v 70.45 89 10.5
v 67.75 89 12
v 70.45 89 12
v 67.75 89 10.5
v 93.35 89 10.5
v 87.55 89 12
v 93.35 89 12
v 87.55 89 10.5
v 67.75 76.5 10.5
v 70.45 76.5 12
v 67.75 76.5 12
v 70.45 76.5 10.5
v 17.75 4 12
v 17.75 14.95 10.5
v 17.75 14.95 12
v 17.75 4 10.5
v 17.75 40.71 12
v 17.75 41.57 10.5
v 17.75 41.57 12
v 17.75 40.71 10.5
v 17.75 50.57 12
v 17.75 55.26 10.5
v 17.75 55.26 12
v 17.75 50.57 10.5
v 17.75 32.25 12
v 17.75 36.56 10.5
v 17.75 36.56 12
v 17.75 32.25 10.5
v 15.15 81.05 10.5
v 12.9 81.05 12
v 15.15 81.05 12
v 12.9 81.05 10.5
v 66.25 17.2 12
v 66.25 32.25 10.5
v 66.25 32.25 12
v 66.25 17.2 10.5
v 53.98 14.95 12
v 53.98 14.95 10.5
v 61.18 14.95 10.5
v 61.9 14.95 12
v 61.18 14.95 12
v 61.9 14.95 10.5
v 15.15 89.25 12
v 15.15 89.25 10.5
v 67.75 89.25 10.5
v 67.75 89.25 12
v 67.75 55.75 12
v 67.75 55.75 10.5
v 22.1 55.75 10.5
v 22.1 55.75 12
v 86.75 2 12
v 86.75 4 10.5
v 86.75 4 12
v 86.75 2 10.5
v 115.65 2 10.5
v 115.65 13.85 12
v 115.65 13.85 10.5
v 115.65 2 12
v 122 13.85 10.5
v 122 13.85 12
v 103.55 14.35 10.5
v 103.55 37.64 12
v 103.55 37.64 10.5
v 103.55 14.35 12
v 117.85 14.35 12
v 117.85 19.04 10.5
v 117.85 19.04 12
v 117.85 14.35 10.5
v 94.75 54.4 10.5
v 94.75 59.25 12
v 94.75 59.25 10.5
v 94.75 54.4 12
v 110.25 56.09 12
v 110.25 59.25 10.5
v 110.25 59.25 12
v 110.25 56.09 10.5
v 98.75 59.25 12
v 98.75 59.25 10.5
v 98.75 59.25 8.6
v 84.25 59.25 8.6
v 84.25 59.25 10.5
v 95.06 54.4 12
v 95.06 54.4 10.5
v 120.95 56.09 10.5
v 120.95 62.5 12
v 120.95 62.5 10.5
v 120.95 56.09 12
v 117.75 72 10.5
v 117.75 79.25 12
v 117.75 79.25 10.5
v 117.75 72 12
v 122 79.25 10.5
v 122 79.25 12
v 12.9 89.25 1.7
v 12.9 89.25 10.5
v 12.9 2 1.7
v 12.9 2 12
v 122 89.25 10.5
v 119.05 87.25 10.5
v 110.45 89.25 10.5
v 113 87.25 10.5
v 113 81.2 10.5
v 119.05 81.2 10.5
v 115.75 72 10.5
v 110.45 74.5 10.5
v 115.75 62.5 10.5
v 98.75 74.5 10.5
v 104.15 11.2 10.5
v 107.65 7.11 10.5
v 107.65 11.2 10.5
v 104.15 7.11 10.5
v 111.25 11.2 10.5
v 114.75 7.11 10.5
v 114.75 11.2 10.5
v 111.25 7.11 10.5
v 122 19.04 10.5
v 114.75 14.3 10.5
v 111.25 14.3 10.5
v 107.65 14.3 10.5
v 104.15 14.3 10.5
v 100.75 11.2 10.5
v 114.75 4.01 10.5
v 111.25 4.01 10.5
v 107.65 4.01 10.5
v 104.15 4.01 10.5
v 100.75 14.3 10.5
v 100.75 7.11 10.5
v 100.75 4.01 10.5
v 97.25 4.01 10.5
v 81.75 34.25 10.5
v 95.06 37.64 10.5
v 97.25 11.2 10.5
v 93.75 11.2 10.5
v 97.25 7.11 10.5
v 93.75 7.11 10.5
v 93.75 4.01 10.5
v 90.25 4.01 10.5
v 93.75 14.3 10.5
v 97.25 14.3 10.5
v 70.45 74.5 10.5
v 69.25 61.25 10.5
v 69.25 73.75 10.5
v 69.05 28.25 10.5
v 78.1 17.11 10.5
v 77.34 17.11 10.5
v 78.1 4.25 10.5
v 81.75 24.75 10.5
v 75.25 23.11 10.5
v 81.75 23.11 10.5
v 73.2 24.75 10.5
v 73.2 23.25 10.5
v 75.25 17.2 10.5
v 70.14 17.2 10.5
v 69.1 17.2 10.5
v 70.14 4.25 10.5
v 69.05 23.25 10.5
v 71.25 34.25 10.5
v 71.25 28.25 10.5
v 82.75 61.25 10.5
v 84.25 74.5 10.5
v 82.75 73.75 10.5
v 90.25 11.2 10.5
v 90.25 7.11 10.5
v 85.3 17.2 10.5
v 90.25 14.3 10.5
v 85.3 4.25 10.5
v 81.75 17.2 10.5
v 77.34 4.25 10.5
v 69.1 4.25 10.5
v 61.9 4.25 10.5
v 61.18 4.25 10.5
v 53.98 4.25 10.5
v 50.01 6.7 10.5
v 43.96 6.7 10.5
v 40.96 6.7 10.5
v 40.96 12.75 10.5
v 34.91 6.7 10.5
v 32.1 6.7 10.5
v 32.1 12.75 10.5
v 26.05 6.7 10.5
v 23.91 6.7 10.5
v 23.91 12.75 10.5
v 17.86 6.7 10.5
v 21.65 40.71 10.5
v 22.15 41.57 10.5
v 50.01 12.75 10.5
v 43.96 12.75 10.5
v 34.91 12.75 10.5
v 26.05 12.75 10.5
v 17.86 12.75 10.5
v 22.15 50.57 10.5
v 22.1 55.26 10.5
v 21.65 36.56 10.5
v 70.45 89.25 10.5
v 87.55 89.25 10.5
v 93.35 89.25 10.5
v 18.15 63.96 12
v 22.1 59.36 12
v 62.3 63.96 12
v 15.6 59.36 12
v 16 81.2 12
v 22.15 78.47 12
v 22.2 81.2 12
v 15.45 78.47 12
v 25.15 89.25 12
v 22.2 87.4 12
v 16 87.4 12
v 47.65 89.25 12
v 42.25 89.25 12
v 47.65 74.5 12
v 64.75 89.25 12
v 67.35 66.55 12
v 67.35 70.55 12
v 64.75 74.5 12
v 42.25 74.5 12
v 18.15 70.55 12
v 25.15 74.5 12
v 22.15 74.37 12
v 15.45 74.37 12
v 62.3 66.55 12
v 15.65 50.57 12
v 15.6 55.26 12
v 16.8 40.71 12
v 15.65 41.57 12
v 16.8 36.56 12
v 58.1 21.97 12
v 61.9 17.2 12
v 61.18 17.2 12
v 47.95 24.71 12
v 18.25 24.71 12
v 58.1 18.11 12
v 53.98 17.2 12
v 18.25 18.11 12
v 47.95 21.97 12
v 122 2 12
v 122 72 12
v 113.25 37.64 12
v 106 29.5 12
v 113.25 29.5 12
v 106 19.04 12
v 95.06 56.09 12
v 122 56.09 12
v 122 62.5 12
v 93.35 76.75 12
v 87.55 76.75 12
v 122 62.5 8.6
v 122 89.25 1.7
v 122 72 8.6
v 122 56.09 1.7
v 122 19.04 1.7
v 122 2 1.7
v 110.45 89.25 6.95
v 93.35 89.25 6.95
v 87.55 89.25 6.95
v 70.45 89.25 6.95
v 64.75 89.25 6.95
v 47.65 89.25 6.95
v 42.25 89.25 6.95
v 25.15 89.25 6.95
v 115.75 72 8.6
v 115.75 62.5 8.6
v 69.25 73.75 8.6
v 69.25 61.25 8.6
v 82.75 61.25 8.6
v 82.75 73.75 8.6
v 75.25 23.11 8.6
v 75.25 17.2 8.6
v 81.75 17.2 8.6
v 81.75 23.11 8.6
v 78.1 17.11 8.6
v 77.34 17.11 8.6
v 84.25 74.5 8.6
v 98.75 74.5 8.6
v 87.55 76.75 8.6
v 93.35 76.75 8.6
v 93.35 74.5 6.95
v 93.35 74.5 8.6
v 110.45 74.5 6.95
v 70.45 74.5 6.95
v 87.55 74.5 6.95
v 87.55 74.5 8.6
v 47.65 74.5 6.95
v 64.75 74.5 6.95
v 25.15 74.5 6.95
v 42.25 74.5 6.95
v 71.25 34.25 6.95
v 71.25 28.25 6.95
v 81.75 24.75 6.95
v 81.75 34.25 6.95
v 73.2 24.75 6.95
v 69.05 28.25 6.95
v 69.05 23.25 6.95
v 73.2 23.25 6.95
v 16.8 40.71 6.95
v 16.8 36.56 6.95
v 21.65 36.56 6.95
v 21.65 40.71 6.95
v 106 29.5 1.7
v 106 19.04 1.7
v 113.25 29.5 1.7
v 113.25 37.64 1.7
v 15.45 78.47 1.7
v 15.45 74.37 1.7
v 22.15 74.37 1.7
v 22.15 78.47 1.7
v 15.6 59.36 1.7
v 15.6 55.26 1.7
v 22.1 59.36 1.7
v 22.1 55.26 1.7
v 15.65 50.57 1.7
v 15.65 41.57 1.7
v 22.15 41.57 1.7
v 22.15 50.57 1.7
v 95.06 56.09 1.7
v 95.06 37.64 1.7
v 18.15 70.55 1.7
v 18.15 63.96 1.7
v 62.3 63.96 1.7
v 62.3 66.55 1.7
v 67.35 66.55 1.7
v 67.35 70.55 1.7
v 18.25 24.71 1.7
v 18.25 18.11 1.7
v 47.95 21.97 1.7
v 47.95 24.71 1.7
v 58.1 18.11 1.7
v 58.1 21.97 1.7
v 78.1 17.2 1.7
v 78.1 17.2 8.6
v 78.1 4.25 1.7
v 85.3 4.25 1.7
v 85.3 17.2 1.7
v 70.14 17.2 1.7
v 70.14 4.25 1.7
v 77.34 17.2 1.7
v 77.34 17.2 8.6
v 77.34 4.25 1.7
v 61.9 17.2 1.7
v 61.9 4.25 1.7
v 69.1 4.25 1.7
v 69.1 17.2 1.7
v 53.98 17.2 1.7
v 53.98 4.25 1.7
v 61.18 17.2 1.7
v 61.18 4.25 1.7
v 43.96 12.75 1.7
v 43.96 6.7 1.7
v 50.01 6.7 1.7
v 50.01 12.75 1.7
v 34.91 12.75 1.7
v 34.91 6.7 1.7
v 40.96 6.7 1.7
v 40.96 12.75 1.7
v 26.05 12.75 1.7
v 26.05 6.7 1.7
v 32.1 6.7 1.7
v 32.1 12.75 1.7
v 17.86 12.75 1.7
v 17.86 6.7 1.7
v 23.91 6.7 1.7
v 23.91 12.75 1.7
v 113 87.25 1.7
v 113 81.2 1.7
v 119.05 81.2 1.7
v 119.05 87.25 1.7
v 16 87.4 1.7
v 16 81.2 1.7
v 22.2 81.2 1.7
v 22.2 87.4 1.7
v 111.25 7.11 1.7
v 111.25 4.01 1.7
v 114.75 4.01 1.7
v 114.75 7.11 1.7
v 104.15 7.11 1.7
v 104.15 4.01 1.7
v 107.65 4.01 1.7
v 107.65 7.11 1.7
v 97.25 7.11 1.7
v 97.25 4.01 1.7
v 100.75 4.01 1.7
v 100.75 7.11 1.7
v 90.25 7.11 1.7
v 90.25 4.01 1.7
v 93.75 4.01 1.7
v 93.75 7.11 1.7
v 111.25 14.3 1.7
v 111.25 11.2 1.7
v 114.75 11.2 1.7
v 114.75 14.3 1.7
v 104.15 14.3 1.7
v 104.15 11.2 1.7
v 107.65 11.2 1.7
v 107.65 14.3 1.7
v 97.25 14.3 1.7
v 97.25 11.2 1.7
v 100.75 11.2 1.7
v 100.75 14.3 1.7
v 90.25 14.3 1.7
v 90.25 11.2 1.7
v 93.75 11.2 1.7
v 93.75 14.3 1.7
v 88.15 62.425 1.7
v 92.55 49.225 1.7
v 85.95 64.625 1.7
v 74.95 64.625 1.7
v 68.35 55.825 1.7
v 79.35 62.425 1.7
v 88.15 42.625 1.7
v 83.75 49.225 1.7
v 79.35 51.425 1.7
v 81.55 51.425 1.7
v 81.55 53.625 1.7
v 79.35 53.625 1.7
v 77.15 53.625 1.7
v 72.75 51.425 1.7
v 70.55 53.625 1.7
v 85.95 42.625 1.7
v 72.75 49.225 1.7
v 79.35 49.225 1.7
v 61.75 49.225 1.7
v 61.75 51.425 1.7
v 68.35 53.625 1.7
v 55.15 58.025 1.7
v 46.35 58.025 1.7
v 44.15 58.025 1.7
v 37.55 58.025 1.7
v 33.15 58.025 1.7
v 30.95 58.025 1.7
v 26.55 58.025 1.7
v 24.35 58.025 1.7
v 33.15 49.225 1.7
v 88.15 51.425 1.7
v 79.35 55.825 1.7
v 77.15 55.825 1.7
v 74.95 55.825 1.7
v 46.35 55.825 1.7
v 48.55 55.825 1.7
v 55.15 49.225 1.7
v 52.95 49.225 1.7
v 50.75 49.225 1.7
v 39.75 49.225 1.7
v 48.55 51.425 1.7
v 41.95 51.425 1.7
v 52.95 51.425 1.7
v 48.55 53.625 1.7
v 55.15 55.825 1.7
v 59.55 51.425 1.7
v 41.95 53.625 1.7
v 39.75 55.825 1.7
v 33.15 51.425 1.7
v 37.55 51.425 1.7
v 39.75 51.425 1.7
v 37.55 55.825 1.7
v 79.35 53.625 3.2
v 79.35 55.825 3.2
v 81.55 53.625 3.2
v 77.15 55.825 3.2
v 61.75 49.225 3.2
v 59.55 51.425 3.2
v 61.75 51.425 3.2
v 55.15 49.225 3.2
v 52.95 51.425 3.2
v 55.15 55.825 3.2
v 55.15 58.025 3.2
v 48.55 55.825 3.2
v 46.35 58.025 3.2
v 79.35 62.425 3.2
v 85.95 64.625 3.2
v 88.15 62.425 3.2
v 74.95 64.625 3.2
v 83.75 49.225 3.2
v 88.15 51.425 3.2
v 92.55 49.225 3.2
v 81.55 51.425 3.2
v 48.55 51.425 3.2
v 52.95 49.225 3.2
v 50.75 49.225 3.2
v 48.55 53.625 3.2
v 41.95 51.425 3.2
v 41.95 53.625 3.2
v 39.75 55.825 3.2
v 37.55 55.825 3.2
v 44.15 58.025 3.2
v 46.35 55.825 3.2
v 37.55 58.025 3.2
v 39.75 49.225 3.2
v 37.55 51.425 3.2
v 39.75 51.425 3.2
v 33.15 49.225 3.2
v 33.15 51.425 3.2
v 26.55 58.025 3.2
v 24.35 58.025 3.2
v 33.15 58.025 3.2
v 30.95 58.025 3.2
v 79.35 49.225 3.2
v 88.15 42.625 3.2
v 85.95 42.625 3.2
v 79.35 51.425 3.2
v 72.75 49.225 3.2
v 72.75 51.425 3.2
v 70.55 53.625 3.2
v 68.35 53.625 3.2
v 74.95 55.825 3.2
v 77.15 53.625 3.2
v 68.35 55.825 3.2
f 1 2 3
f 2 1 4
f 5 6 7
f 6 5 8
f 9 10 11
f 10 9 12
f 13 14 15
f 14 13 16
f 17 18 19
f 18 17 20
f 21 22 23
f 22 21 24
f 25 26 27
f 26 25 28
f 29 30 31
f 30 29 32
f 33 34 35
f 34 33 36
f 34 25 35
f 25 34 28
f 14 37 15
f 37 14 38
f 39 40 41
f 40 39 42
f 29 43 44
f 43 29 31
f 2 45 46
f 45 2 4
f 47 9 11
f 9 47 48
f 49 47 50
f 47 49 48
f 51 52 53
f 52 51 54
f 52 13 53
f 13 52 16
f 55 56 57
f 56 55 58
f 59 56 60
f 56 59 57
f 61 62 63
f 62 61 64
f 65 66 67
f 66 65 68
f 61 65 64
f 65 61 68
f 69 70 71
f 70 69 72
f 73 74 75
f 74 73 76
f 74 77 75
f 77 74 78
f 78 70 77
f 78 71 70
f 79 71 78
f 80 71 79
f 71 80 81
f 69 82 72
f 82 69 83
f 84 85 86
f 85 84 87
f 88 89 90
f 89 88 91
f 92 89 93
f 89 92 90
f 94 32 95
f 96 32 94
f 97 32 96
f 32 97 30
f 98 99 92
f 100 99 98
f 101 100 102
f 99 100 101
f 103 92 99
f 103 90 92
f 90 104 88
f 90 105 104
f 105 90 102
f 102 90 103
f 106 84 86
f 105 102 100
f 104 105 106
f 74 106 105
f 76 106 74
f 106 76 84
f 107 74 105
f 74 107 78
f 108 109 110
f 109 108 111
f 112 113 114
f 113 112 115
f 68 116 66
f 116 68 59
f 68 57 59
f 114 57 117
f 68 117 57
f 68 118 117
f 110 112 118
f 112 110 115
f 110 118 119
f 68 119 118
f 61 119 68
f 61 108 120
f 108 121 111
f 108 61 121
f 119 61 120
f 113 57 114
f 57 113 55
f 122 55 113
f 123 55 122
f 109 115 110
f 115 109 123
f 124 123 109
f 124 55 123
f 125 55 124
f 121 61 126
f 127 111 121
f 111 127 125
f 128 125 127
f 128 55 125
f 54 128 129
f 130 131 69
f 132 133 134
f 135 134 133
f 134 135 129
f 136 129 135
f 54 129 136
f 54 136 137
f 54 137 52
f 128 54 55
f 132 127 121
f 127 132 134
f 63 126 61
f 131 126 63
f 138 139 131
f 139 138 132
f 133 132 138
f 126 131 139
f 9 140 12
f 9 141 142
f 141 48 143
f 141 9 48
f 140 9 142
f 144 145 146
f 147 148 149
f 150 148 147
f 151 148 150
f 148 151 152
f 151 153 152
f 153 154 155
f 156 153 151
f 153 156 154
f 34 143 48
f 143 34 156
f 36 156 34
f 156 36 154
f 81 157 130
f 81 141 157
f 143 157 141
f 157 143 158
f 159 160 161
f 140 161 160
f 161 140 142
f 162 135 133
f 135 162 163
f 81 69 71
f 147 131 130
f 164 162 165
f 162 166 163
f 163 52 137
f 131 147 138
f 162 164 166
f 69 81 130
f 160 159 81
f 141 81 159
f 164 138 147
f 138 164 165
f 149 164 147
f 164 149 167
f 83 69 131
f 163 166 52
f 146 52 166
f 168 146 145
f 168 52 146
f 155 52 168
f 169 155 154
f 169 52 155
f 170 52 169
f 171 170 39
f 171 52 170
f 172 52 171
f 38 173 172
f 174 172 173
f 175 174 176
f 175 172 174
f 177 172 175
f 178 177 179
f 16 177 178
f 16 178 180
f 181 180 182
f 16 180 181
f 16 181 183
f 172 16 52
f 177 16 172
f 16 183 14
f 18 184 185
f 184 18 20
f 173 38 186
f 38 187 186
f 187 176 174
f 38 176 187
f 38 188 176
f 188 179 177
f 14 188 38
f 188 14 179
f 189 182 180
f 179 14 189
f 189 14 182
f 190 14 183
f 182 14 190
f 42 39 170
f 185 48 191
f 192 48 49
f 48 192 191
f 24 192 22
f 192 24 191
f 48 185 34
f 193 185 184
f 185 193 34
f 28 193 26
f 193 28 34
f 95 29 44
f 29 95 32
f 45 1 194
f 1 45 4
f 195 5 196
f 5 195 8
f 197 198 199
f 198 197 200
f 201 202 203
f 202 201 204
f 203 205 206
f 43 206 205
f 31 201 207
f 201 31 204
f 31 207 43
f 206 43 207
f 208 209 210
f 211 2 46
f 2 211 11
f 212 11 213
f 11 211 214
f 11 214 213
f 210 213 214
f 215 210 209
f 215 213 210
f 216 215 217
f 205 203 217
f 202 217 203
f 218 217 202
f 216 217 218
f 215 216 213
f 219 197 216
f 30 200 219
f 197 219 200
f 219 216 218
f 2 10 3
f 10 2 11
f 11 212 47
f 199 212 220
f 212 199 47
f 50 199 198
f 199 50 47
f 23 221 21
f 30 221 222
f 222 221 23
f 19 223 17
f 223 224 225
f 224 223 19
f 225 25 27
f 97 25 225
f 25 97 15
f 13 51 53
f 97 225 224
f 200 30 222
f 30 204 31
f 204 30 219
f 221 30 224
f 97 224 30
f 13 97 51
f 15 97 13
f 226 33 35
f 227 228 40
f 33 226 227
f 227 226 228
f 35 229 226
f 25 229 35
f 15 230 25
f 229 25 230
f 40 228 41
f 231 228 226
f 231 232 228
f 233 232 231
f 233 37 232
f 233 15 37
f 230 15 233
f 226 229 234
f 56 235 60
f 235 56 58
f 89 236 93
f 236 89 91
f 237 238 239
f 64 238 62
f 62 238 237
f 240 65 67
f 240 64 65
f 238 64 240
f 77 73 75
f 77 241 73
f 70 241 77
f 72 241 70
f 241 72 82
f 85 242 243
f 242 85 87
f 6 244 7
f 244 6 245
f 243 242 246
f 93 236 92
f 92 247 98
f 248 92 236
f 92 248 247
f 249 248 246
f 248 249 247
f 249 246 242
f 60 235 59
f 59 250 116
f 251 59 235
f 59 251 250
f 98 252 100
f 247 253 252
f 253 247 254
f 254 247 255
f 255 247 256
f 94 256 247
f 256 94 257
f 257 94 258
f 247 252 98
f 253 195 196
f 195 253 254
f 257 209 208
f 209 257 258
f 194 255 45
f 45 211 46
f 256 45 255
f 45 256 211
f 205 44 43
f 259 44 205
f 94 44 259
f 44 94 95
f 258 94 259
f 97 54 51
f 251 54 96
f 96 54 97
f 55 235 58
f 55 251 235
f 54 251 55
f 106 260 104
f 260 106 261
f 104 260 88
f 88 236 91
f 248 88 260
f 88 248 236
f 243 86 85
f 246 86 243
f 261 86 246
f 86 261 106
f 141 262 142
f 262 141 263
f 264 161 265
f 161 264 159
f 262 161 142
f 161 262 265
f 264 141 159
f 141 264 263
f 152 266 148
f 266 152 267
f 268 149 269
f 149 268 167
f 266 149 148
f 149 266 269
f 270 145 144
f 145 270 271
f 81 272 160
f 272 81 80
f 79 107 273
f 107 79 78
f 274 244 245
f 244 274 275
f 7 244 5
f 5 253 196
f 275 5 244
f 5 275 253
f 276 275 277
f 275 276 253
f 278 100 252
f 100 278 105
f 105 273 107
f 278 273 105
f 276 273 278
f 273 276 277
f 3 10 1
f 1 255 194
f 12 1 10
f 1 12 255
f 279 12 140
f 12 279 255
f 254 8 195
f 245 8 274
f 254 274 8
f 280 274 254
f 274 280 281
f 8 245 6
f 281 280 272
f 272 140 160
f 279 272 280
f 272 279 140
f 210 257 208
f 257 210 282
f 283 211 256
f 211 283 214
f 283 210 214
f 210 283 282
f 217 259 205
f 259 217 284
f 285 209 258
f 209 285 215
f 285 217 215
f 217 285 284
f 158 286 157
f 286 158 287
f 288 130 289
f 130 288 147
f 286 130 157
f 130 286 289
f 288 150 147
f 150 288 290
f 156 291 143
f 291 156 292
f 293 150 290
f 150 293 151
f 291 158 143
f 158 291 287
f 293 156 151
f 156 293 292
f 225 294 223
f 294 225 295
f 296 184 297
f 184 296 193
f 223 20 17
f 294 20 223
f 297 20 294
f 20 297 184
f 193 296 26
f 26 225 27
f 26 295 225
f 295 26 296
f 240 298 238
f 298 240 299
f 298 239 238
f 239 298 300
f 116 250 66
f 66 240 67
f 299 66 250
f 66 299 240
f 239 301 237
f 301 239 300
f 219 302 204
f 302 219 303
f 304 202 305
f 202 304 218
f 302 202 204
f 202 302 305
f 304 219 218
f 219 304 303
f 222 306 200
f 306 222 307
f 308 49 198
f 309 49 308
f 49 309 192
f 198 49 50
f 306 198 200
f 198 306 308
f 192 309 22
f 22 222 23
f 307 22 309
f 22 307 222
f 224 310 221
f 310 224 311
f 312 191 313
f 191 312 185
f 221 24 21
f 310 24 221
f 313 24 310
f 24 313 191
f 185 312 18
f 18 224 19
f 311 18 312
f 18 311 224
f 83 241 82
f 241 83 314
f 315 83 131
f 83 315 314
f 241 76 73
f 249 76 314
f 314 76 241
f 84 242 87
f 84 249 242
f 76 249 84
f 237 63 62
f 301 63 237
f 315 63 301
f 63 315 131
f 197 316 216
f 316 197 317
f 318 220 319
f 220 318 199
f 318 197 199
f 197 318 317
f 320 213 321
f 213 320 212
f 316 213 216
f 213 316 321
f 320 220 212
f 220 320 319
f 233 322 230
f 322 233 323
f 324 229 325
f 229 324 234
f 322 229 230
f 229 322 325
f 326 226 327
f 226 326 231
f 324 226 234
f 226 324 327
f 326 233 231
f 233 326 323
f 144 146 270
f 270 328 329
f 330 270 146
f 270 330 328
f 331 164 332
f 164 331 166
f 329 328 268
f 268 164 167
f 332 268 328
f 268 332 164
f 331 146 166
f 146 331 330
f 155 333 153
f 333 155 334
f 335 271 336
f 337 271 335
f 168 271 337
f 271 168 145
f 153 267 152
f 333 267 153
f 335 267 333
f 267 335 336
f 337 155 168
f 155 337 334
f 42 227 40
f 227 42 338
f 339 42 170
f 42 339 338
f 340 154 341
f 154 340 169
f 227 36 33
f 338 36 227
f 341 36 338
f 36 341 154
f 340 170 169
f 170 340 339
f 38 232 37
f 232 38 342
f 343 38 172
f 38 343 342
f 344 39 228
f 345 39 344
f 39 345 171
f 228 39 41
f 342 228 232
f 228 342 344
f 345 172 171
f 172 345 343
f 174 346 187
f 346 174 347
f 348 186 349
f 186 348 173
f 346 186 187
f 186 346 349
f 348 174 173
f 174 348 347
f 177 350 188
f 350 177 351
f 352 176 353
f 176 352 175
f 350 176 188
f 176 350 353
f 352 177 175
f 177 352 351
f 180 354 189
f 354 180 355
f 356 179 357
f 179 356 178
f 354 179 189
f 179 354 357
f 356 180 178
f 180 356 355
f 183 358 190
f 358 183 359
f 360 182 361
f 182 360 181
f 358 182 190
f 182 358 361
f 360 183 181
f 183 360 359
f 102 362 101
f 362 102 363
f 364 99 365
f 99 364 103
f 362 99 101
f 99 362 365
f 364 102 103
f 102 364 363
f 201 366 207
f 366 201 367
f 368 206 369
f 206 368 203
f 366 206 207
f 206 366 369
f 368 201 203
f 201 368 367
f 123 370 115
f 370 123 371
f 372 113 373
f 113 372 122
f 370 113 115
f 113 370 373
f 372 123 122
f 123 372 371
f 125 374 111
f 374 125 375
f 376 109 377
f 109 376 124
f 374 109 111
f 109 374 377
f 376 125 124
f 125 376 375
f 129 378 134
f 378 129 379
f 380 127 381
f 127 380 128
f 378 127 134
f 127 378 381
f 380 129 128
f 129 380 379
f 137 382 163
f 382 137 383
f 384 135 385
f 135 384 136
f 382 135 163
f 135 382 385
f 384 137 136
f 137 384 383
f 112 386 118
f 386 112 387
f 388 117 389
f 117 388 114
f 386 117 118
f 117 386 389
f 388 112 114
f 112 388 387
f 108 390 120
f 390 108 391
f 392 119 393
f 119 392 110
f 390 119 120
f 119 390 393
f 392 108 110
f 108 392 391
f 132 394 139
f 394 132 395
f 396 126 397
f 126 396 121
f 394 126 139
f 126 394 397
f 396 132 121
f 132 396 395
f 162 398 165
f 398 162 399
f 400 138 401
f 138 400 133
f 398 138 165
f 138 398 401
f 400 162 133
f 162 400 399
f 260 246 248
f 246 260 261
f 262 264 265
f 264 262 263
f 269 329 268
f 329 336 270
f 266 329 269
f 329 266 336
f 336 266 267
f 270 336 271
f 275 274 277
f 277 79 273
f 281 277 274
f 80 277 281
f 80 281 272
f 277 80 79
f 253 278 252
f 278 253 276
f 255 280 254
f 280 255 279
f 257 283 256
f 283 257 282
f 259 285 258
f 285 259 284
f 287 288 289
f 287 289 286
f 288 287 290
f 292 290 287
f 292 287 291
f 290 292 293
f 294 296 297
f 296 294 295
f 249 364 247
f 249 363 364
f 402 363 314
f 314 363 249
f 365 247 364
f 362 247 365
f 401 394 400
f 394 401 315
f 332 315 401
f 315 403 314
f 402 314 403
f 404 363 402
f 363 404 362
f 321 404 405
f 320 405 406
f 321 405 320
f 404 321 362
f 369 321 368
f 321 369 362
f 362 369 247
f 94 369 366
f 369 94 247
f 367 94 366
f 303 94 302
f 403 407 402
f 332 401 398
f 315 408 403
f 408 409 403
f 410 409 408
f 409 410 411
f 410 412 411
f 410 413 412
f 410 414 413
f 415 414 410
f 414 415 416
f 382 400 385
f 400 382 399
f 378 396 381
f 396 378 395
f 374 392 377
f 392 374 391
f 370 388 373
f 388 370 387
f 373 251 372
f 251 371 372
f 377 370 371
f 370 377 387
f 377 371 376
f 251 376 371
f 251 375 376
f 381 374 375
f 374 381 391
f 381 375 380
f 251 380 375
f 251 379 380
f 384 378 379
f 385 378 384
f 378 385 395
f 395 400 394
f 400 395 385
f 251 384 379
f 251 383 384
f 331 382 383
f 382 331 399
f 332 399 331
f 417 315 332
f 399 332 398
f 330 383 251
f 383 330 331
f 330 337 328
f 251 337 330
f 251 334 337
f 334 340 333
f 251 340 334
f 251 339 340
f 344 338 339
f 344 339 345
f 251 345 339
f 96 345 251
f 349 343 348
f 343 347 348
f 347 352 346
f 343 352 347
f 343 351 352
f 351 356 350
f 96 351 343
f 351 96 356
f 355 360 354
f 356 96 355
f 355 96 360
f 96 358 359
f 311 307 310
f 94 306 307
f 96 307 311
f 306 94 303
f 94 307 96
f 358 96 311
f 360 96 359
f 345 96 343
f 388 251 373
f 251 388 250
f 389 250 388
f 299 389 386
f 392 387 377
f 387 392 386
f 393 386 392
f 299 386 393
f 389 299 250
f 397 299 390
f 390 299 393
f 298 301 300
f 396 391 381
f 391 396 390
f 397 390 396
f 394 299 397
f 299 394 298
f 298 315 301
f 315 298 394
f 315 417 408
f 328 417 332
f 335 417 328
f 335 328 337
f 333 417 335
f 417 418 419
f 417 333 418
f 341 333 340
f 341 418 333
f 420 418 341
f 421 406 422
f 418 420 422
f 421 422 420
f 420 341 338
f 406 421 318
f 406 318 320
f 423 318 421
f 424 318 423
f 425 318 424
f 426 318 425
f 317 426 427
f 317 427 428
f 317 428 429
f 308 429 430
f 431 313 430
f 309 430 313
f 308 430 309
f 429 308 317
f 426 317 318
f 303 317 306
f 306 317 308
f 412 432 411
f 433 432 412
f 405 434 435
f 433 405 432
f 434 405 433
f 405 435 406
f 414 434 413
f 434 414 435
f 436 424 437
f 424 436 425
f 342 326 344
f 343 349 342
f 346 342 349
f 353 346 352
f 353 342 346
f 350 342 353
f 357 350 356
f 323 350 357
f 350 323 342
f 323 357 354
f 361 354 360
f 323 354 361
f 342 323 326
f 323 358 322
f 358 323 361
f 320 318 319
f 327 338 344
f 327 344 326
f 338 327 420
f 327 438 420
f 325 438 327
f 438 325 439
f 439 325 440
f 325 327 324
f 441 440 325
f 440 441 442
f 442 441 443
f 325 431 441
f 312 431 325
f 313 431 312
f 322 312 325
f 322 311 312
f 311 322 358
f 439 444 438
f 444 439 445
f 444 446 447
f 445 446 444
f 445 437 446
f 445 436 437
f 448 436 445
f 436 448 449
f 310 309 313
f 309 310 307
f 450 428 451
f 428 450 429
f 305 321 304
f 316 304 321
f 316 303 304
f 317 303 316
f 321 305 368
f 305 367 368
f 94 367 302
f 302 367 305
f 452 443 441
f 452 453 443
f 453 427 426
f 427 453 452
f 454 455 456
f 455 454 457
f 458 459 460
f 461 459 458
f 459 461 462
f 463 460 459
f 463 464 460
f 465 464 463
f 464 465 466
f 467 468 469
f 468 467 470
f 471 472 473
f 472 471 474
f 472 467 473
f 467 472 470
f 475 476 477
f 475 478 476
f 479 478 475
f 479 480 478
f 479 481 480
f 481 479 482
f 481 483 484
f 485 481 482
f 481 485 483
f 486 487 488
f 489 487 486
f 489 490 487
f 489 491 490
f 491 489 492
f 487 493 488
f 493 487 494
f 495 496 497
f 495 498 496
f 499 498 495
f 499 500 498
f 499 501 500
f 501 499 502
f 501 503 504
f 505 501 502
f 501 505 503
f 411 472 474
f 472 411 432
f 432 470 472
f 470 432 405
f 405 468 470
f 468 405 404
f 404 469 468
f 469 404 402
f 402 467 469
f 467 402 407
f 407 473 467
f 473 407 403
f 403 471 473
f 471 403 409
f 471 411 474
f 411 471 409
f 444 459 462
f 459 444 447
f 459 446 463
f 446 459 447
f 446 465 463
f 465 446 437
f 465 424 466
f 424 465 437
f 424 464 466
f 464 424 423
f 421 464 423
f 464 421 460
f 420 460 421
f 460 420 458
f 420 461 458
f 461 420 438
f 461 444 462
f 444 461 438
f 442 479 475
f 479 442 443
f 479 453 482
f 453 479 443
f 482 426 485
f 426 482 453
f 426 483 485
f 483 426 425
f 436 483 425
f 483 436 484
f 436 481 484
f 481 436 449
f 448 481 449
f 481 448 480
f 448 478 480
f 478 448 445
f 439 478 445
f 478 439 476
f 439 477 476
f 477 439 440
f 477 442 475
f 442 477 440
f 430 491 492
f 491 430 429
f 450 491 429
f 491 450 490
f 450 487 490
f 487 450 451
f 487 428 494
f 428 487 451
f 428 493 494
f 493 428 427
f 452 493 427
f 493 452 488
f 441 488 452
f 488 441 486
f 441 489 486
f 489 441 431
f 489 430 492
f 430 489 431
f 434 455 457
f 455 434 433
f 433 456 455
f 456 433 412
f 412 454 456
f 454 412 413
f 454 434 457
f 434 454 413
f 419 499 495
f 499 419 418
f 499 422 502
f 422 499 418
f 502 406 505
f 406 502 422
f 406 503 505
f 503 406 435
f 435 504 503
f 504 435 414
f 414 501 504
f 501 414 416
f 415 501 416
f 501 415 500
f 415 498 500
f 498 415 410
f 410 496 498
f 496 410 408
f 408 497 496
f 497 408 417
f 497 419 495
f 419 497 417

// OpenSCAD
// file: zipcpu.scad
zlogow = 62;
zlogol = 14;
zlogob =  6;
zlogoh = 5;
module	zipcpulogo() {
	linear_extrude(height=zlogoh) {
		union() {
			// Z
			polygon(points=[
				[0,0],
				[8,0],
				[10,2],
				[4,2],
				[16,14],
				[6,14],
				[4,12],
				[12,12] ]);
			// Dot on the 'i'
			polygon(points=[
				[10,4],
				[12,4],
				[14,6],
				[12,6] ]);
			// The 'p'
			polygon(points=[
				[4,-6],
				[6,-6],
				[12,0],
				[18,0],
				[22,4],
				[22,6],
				[16,6],
				[14,4],
				[20,4],
				[18,2],
				[12,2] ]);
			// The C
			polygon(points=[
				[28,0],
				[28,2],
				[34,8],
				[42,8],
				[40,6],
				[34,6],
				[30,2],
				[36,2],
				[34,0] ]);
			// The P
			polygon(points=[
				[36,0],
				[38,0],
				[40,2],
				[46,2],
				[50,6],
				[50,8],
				[44,8],
				[42,6],
				[48,6],
				[46,4],
				[40,4]]);
			// The U
			polygon(points=[
				[48,0],
				[54,0],
				[62,8],
				[60,8],
				[54,2],
				[50,2],
				[56,8],
				[54,8],
				[48,2]]);
		}
	}
}

// zipcpulogo();
// translate([0,-zlogob,-zlogoh]) color("red") cube([zlogow, zlogol+zlogob, zlogoh]);
// main file
include <zipcpu.scad>
// include <artylogo.scad>

module arty() {
	// Top left is power, right side is the FMC connector
	raw_width  = 109.1;
	raw_length =  87.25;
	raw_height_above_board = 10.3;
	zh = 2;
	tol = 0.1;

	module cutout(x, y, w, h, v) {
		ex = 1.5;
		translate([x-ex/2,y-ex/2,-tol/2])
			cube([w+ex,h+ex,v+tol]);
	}

	module keepit(x, y, w, h, v) {
		ex = -1.5;
		translate([x-ex/2,y-ex/2,-tol/2])
			cube([w+ex,h+ex,v+tol]);
	}

	module layer(n) {
		base = (n==0) ? 0
			: (n == 1) ? 1.5
			: (n == 2) ? 3.35
			: (n == 3) ? 5.0
			: (n == 4) ? 6.8
			: (n == 5) ? 11.0
			: raw_height_above_board;

		ztmp = (n==0) ? 1.5
			: (n == 1) ? 3.35
			: (n == 2) ? 5.0
			: (n == 3) ? 6.8
			: (n == 4) ? 11.0
			: raw_height_above_board;

		zh = ztmp - base;

		above = raw_height_above_board;
		//

		// External power
		// Power plug
		cutout(0,26.75-8.96,15.25,8.96,above);
		// Power jumper
		// cutout(7.86-4.97,26.75+1.5,4.97,5,above);
		cutout(0,26.75+1.5-3,8,11,above);
		// Startup jumper
		cutout(raw_width-8.5,raw_length-14.13,5.2,2.6,above);
		// CK-Reset jumper
		cutout(raw_width-8.45,raw_length-33.24,5,2.6,above);
		// SPI jumper
		cutout(raw_width-8.5,raw_length-46.93,5,7.5,above);
		// Ethernet port
		cutout(0,53.34-16.95,26.19,16.95,above);
		//
		// Arduino header
		// Top lower
		cutout(103.1-42.65, 67.71-5, 42.65,4.51,above);
		// Top upper
		cutout(103.1-47.70, 67.71-2.41, 47.70,2.5,above);
		//
		// Bottom upper
		cutout(103.0-28.20, 21.96-4.36, 28.20, 4.36,above);
		// Bottom lower
		cutout(103.0-38.35, 21.96-5.1, 38.35,  2.36,above);
		//
		// 4 Switches
		cutout(67.2-29.75, 3, 5.7, 11.45,above);
		cutout(67.2-21.79, 3, 5.7, 11.45,above);
		cutout(67.2-13.55, 3, 5.7, 11.45,above);
		cutout(67.2- 5.63, 3, 5.7, 11.45,above);
		// 4x Buttons
		cutout(raw_width-36.36,5.45,4.55,4.55,above);
		cutout(raw_width-27.31,5.45,4.55,4.55,above);
		cutout(raw_width-18.45,5.45,4.55,4.55,above);
		cutout(raw_width-10.26,5.45,4.55,4.55,above);
		// Program Button
		cutout(3.7,raw_length-7.3,4.55,4.55,above);
		// Reset Button
		cutout(raw_width-8.55,raw_length-7.3,4.7,4.7,above);

		// 4 color LED's
		cutout( 8.0,2.76,2,1.6,above);
		cutout(15.1,2.76,2,1.6,above);
		cutout(22.0,2.76,2,1.6,above);
		cutout(29.0,2.76,2,1.6,above);
		// 4 regular LED's
		cutout( 8.0,9.95,2,1.6,above);
		cutout(15.1,9.95,2,1.6,above);
		cutout(22.0,9.95,2,1.6,above);
		cutout(29.0,9.95,2,1.6,above);

		translate([0,0,base]) {
			// pad platform
			if (n == 0) {
				//
				// Set up some pads to connect to the board
				// itself
				//
				difference() {
					color("black") {
						cube([raw_width,raw_length,zh]);
					}
					translate([0,0,-zh/2]) { union() {
					nh = zh*2;
					// Between PMOD's
					keepit(12.3,raw_length-13.5,95,14,nh);

					// Right edge
					keepit(raw_width-5.6,0,7,79.8,nh);

					// Bottom arduino header
					keepit(55, 12.2, raw_width-55, 18.8,above);
					// Top arduino header
					keepit(53.5, 53, raw_width-55, raw_length-52,above);
					// Below switches
					keepit(34.5, -1, raw_width-30, 3.75,above);
					// Left of LEDs
					keepit(-1, -1, 8.1, 13.6,above);
					// Above LED's, near power/enet
					keepit(3.40, 11.6, 19.2-3.4, 46-11.6,above);

					// Left edge
					// Left edge, above ethernet port
					keepit(11, 58-6.35, 17, 6.35,above);
					// Left edge, below USB port
					keepit(-2, 53, 3.8, 8.8,above);
					// Left edge, above USB port
					keepit(-2, 69, 7, 78-69,above);
				}}}
			}

			// 3.4
			if (n <= 1) {
				// Micro USB port
				cutout(0,raw_length-26.0, 5.5, 8,zh);
				//
				// 3R3 on top + Cap on the side
				cutout(40,60,12,11,zh);
				//
				// Lower under "A" blob
				cutout(41,20.36-4.5,5,4.5,zh);
				//
				// Chip on top, between pmods
				cutout(24,58, 37-24,74-58,zh);
			}

			// 5.0mm
			if (n <= 2) {
				// 5.0mm
				//
				// PMod row across the top
				cutout(12.3,raw_length-14,15.6,14,zh);
				cutout(35.2,raw_length-14,15.6,14,zh);
				cutout(58.0,raw_length-14,15.6,14,zh);
				cutout(80.5,raw_length-14,15.6,14,zh);
				//
				// under A blob
				cutout(41,23.5,9.0,8.0,zh);
				//
				// Cap left
				cutout(52.9-3.35,25.5-3.5,2.65,3.5,zh);
				// Cap right
				cutout(raw_width-8,37.96-2.65,3.35,2.65,zh);
			}

			/*
			// 6.8mm
			if (n <= 3) {
				// Big USB port
				cutout(raw_width-38.15,raw_length-14.3,13.2,14.3,zh);
			}

			// 11mm 
			if (n <= 4) {
				// Top of VGA
				// cutout(76.37-30.73,raw_length-4.55,30.73,4.55,zh);
				cutout(76.37-30.73,raw_length-7.8,30.73,7.8,zh);
				cutout(68.6-16.15,raw_length-16.0,16.15,16.0,zh);
			}
			*/
		}
	}

	module	embossZip() {
		s = 1.1;
		depth = 1.5;
		translate([raw_width/2+9, raw_length/2+8, raw_height_above_board+zlogoh/2-depth]) {
			rotate([0,0,0]) scale([s,s,1]) {
				translate([-zlogow/2,(zlogob-zlogol)/2,
							-zlogoh/2])
						zipcpulogo();
			}
		}
	}

	module	embossArty() {
/*
		s = 1.2;
		depth = 1.5;
		translate([raw_width/2, raw_length/2-15,
			   raw_height_above_board+artylogo_h/2-depth]) {
			rotate([0,0,0]) scale([s,s,1]) {
				translate([-artylogo_w/2,
						(-artylogo_l)/2,
							-artylogo_h/2])
						artylogo();
			}
		}
*/
	}

	difference() {
		cube([raw_width,raw_length,raw_height_above_board]);
		layer(0);
		layer(1);
		layer(2);
		layer(3);
		layer(4);
		layer(5);
		embossZip();
		// embossBasys3();
	}

}

translate([122,2,12]) {
	rotate([0,180,0])
		arty();
}

/*
translate([122,2,12]) { // ... 0-30
	rotate([0,180,0]) {
		difference() {
			arty();
			translate([30,-2,-2])
			 	cube([120,92,15]);
	// raw_width  = 109.1;
	raw_length =  87.25;
	// raw_height_above_board = 10.3;
		}
	}
}

translate([120,2,12]) { // ... 30-58
	rotate([0,180,0]) {
		difference() {
			arty();
			translate([-2,-2,-2])
			 	cube([32,92,15]);
			translate([58,-2,-2])
			 	cube([120,92,15]);
	// raw_width  = 109.1;
	raw_length =  87.25;
	// raw_height_above_board = 10.3;
		}
	}
}

translate([116,2,12]) { ///... 58-86
	rotate([0,180,0]) {
		difference() {
			arty();
			translate([-2,-2,-2])
			 	cube([58,92,15]);
			translate([86,-2,-2])
			 	cube([120,92,15]);
	// raw_width  = 109.1;
	raw_length =  87.25;
	// raw_height_above_board = 10.3;
		}
	}
}

translate([114,2,12]) { ///... 86 - end
	rotate([0,180,0]) {
		difference() {
			arty();
			translate([-2,-2,-2])
			 	cube([88,92,15]);
	// raw_width  = 109.1;
	raw_length =  87.25;
	// raw_height_above_board = 10.3;
		}
	}
}
*/
